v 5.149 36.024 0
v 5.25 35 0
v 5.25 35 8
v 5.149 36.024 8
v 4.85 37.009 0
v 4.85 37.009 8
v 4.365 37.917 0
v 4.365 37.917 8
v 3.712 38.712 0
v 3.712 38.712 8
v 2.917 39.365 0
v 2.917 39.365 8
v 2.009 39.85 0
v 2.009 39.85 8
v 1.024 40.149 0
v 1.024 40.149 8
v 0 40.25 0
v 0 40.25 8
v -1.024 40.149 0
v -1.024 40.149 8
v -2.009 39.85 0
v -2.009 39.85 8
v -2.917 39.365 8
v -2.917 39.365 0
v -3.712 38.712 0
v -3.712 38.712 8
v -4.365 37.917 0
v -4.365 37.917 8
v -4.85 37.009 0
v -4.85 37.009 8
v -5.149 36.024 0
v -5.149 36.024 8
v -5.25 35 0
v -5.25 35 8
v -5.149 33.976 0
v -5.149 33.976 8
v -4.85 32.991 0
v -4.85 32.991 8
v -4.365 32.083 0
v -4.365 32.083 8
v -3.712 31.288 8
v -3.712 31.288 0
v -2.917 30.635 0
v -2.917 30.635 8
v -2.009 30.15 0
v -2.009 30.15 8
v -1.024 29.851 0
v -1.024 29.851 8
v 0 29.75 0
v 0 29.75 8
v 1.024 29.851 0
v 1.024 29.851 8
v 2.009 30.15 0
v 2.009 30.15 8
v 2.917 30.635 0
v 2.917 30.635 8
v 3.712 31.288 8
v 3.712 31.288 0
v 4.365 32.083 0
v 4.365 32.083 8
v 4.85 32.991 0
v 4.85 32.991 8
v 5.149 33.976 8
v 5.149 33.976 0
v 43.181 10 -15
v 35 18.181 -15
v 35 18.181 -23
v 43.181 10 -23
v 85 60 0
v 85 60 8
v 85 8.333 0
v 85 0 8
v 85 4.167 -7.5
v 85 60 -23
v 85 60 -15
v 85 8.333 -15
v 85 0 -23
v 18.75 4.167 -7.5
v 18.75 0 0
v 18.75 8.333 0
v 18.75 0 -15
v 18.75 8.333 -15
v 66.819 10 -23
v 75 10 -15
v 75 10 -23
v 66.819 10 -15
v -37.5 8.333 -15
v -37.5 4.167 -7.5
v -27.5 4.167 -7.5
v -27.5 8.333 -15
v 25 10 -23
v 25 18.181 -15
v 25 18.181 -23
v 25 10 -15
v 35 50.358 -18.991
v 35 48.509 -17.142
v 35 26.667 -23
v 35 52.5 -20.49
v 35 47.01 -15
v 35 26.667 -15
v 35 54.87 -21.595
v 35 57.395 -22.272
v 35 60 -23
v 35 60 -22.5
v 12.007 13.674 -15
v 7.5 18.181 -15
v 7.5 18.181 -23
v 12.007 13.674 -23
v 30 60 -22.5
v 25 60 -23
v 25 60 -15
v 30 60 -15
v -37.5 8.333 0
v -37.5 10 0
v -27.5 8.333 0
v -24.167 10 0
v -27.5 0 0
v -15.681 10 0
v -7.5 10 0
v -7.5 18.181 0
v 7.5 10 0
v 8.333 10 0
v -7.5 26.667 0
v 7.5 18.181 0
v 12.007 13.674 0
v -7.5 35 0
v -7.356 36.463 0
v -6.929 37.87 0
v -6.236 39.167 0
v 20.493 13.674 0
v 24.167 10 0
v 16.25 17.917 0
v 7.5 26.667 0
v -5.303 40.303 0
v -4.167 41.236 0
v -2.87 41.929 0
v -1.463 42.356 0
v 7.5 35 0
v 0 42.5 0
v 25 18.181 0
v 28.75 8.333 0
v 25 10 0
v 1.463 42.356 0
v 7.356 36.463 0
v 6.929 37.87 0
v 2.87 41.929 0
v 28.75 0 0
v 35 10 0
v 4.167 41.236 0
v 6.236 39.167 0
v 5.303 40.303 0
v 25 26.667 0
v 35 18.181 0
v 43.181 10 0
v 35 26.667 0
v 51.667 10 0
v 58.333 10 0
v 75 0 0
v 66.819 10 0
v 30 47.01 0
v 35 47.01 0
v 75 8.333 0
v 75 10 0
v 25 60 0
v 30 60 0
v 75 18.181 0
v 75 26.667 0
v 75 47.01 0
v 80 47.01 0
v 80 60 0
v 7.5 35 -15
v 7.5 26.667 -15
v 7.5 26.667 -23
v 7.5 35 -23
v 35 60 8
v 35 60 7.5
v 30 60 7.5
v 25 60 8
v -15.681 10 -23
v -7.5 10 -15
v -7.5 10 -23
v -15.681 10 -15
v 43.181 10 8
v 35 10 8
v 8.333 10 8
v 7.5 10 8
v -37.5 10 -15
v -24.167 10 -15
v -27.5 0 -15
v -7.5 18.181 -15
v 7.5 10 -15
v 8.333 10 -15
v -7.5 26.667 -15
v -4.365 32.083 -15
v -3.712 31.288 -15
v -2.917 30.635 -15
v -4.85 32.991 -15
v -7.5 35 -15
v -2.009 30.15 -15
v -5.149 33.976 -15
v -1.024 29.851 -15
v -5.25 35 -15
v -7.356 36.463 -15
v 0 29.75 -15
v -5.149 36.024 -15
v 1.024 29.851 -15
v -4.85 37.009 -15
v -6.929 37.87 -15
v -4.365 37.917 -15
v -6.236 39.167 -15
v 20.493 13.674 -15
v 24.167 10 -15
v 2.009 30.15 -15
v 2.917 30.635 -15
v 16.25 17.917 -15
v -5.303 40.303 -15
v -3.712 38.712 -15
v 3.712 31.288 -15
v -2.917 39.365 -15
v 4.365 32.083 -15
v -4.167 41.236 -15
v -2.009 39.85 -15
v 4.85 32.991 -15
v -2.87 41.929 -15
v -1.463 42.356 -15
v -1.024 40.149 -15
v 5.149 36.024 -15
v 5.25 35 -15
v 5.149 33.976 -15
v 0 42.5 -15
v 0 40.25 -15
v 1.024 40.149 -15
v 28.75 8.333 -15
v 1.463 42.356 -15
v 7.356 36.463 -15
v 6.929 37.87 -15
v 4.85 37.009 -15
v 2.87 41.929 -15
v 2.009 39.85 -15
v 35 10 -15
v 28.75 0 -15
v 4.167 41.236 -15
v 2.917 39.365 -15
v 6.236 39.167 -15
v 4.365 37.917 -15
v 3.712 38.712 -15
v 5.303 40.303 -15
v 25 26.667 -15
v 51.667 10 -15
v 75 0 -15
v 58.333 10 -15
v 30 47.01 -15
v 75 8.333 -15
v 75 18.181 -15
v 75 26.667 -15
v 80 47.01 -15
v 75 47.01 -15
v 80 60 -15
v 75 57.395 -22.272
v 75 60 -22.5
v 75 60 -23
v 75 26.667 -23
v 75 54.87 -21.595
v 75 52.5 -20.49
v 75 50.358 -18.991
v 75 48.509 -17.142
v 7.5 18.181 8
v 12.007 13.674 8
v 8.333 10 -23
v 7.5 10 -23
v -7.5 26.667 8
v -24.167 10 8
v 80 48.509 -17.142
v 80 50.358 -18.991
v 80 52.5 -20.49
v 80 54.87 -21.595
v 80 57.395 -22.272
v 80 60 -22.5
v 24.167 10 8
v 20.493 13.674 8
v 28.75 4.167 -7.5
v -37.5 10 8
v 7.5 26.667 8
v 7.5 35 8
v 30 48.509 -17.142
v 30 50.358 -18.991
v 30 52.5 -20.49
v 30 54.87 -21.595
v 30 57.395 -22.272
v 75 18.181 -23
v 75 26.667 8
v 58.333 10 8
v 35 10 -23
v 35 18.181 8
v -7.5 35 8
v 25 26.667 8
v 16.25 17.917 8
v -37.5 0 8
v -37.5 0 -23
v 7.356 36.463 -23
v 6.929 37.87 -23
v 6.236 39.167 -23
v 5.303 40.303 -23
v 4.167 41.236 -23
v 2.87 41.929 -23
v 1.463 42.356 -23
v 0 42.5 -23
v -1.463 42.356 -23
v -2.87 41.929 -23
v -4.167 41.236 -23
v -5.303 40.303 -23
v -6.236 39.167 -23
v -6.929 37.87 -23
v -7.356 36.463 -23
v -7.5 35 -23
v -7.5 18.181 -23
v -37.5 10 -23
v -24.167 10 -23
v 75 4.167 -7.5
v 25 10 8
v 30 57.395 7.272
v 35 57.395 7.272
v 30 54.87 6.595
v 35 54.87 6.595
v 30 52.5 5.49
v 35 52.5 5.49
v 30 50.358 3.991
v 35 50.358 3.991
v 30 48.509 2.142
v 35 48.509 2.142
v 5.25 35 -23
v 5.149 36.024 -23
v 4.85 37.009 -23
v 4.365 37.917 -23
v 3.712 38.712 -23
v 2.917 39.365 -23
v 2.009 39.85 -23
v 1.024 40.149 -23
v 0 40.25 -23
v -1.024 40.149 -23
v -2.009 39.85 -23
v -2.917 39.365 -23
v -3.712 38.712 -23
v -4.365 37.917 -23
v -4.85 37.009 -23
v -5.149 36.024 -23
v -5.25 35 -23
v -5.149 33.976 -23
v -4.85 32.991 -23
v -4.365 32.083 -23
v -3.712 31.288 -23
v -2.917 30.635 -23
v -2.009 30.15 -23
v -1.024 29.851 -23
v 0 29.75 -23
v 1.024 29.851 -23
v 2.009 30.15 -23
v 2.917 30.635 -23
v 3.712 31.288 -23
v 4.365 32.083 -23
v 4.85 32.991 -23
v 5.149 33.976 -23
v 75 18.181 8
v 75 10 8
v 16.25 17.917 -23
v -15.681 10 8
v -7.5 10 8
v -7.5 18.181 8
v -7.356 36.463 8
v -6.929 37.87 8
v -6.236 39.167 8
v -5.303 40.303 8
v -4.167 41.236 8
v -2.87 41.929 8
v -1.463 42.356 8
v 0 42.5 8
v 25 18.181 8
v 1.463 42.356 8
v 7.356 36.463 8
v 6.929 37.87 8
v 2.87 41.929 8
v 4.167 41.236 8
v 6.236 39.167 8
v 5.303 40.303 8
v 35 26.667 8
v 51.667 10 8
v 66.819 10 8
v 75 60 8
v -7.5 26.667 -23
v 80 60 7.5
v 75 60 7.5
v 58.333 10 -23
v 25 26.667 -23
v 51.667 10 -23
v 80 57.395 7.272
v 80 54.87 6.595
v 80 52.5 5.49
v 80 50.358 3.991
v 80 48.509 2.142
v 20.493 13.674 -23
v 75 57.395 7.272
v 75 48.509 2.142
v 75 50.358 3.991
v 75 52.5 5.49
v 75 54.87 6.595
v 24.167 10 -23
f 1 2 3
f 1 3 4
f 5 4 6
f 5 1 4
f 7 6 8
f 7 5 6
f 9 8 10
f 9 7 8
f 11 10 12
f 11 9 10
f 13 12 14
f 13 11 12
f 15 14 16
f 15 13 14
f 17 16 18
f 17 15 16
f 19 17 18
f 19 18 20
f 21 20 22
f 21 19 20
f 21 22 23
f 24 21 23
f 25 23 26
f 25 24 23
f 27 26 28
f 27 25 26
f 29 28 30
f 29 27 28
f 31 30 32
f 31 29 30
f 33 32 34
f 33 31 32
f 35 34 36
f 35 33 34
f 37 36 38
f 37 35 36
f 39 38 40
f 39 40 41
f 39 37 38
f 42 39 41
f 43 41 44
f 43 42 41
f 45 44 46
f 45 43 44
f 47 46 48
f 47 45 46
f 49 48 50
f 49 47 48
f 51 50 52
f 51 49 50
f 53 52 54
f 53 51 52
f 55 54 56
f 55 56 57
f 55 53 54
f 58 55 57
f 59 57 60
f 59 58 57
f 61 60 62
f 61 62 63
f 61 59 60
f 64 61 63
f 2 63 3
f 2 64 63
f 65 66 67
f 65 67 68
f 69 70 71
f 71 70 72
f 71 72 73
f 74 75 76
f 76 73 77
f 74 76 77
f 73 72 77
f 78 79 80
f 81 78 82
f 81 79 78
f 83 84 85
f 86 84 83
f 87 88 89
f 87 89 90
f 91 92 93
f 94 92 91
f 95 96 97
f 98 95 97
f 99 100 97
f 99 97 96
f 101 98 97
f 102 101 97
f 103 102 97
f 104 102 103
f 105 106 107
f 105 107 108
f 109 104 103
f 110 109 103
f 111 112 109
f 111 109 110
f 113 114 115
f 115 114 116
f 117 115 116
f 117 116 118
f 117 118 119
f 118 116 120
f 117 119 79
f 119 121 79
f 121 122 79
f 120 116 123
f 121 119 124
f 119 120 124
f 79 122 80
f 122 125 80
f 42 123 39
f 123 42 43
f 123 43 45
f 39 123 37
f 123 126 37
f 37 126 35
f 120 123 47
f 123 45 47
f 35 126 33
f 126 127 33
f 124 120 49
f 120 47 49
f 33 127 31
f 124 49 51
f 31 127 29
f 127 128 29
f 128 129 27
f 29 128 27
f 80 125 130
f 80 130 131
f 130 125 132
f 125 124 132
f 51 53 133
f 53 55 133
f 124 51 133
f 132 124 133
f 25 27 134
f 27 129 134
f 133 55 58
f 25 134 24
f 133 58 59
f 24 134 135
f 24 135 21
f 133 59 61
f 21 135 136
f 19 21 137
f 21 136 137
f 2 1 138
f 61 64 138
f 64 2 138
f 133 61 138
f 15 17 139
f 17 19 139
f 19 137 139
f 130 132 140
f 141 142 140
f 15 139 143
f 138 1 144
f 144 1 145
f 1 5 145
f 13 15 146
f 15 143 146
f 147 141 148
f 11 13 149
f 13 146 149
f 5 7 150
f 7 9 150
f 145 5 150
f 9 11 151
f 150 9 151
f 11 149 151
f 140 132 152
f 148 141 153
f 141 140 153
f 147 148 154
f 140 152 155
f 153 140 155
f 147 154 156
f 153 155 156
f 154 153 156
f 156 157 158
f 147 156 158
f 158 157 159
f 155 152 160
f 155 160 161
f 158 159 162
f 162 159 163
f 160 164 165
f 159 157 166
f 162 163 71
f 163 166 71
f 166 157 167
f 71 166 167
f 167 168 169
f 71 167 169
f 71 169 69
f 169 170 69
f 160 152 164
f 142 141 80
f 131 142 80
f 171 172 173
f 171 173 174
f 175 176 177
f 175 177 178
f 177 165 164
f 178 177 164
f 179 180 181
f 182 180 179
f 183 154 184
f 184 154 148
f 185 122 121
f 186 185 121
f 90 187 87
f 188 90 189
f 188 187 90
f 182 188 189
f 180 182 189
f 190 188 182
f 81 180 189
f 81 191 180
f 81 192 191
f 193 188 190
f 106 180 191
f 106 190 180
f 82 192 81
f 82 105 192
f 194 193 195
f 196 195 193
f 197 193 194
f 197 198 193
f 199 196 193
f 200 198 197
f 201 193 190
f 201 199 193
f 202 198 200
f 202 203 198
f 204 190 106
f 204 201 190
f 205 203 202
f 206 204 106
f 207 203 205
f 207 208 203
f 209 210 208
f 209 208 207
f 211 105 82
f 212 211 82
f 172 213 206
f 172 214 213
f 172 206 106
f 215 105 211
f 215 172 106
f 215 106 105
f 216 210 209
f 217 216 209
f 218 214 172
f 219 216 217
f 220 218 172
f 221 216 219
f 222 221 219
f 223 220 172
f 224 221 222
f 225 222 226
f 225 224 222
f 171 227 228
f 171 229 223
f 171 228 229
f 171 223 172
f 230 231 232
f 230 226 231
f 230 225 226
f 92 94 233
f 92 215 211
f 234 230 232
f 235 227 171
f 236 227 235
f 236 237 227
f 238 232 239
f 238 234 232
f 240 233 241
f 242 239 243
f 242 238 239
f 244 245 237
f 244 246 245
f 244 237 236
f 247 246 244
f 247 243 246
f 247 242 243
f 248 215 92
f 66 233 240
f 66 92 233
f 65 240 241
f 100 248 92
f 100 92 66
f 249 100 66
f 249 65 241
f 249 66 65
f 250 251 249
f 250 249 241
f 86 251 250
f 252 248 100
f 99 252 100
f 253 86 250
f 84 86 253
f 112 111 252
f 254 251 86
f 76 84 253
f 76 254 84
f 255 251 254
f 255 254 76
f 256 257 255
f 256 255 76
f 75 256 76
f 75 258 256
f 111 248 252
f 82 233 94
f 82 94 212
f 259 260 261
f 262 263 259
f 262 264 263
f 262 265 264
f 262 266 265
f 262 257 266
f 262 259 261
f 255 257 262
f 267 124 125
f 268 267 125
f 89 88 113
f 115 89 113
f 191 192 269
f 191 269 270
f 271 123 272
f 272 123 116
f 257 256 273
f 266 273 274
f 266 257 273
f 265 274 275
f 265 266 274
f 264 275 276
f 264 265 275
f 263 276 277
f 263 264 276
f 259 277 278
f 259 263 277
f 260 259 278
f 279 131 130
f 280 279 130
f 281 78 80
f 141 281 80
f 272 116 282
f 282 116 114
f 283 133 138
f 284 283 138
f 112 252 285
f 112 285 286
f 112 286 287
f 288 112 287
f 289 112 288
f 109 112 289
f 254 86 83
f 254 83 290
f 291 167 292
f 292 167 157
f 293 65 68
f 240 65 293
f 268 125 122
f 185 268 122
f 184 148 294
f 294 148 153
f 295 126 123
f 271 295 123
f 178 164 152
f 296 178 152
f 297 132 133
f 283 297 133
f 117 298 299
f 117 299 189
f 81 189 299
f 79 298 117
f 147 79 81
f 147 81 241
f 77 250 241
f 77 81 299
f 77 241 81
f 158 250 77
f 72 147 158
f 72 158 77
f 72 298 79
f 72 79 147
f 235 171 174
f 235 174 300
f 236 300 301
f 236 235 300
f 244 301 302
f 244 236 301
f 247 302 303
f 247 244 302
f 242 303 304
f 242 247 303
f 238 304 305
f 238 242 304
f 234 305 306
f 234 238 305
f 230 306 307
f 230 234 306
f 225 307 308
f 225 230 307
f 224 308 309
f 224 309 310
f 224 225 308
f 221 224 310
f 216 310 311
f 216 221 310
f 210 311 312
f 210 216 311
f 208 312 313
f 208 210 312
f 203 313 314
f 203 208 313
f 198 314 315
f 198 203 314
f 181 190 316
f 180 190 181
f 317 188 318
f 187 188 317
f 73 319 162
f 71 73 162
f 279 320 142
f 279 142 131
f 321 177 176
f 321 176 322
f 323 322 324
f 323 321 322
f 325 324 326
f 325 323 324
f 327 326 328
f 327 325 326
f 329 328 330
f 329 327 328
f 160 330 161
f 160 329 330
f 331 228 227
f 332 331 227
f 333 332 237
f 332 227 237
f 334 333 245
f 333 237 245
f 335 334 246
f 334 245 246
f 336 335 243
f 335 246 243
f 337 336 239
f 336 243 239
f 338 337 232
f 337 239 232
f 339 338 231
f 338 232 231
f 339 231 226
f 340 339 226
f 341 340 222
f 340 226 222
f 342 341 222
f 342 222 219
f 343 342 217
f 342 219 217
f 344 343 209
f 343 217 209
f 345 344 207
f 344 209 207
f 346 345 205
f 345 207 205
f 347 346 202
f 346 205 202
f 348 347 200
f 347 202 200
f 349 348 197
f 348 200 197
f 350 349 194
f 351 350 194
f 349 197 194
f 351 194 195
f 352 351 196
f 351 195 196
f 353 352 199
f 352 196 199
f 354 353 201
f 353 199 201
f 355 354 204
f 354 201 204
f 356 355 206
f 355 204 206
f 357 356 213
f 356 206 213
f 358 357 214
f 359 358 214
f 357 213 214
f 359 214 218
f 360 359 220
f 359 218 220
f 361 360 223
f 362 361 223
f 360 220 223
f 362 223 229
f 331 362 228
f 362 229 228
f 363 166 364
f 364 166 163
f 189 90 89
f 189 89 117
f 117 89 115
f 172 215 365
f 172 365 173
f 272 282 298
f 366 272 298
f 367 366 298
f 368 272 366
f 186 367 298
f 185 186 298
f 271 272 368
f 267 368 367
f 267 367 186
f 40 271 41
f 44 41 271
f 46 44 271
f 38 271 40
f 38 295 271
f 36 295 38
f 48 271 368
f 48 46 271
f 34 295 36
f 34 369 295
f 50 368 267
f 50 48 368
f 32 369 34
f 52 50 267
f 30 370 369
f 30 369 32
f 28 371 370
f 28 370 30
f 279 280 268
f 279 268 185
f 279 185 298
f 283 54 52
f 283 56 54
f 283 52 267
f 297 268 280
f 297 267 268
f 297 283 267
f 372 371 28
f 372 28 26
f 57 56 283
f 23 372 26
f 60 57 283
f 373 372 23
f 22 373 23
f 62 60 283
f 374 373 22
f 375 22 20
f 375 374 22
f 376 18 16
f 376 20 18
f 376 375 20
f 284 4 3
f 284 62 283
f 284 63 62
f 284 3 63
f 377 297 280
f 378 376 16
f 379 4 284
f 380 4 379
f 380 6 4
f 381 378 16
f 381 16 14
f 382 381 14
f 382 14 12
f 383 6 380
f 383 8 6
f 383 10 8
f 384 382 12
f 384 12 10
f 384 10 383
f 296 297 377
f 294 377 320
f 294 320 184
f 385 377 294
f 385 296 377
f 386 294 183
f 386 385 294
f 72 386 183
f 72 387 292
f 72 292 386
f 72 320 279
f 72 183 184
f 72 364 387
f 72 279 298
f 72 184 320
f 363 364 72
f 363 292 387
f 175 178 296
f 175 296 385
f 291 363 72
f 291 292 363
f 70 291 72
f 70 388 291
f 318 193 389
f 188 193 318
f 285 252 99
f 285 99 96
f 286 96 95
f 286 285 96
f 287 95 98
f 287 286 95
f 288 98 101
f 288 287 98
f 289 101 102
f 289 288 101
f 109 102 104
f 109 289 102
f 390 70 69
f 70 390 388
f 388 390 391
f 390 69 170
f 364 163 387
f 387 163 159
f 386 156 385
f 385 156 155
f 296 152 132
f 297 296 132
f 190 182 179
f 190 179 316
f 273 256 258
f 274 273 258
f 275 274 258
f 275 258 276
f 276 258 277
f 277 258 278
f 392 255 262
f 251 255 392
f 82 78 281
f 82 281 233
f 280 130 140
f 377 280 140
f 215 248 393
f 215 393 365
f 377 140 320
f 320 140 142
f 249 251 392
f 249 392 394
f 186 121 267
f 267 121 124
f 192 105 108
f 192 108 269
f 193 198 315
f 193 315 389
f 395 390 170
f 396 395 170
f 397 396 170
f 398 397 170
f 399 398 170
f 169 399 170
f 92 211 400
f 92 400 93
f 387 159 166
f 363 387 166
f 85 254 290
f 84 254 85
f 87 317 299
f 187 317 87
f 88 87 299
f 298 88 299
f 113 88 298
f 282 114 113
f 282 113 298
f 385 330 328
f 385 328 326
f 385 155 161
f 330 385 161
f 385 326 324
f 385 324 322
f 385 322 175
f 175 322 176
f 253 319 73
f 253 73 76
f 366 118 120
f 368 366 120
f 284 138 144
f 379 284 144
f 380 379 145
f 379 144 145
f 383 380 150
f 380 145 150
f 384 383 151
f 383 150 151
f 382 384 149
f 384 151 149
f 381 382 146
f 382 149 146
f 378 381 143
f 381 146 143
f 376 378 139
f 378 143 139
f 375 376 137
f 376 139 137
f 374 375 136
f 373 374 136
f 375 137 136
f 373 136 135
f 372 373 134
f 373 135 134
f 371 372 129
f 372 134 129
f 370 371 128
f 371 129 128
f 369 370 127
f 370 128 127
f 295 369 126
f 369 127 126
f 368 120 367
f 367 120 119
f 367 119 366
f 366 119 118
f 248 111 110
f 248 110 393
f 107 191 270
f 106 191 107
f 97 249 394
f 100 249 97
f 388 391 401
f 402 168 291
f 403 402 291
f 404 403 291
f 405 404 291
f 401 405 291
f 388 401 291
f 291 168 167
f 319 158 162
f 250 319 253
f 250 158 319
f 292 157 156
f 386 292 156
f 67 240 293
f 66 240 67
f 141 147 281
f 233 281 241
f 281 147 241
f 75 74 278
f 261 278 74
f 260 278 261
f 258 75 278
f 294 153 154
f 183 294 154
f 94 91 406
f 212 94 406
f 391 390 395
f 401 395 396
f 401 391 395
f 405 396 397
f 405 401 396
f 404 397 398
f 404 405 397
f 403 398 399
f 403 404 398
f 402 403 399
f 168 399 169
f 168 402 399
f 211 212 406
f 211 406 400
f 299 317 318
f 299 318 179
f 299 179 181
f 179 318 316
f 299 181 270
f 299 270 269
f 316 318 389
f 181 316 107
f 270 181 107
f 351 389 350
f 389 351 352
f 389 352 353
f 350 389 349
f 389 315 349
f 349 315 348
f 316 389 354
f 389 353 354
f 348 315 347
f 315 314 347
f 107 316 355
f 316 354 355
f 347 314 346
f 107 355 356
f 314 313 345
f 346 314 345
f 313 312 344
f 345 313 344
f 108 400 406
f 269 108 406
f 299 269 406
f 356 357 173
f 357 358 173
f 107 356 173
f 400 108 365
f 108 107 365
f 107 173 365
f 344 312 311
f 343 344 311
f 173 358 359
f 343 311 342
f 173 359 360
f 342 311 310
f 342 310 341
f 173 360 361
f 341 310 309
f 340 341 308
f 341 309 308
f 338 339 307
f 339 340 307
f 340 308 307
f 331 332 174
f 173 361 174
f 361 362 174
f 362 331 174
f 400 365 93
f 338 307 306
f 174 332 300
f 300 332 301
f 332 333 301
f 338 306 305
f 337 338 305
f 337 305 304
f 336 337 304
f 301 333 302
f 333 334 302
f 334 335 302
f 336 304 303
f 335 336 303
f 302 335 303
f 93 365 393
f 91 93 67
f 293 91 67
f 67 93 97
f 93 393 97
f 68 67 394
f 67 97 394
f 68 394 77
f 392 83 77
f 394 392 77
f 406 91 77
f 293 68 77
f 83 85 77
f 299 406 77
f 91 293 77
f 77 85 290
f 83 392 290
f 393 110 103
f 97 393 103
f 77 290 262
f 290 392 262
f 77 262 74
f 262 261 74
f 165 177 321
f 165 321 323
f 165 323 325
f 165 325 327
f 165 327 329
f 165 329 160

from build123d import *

# Parameters (mm, degrees)
SKETCH1_R            = 5.25
BOSS_EXTRUDE1_DEPTH  = 8
BOSS_EXTRUDE2_DEPTH  = 10
LPATTERN1_COUNT      = 3
LPATTERN1_PITCH      = 56.25
MIRROR1_COPY_1_DEPTH = 10
MIRROR1_COPY_2_DEPTH = 10
CUT_EXTRUDE1_START   = -5
SKETCH3_R            = 15
CUT_EXTRUDE1_DEPTH   = 50


with BuildPart() as part:
    # Sketch1 → Boss-Extrude1 (new body)
    with BuildSketch(Plane.XY):
        with BuildLine():
            Line((85, 0), (85, 60))
            Line((85, 60), (75, 60))
            Line((75, 60), (75, 26.666666667))
            Line((75, 26.666666667), (58.333333333, 10))
            Line((58.333333333, 10), (51.666666667, 10))
            Line((51.666666667, 10), (35, 26.666666667))
            Line((35, 26.666666667), (35, 60))
            Line((35, 60), (25, 60))
            Line((25, 60), (25, 26.666666667))
            Line((25, 26.666666667), (16.25, 17.916666667))
            Line((16.25, 17.916666667), (7.5, 26.666666667))
            Line((7.5, 26.666666667), (7.5, 35))
            ThreePointArc((7.5, 35), (0, 42.5), (-7.5, 35))
            Line((-7.5, 35), (-7.5, 26.666666667))
            Line((-7.5, 26.666666667), (-24.166666667, 10))
            Line((-24.166666667, 10), (-37.5, 10))
            Line((-37.5, 10), (-37.5, 0))
            Line((-37.5, 0), (85, 0))
        make_face()
        Polygon((12.007359313, 13.67402598), (8.333333333, 10), (7.5, 10), (7.5, 18.181385292), align=None, mode=Mode.SUBTRACT)
        with Locations((0, 35)):
            Circle(SKETCH1_R, mode=Mode.SUBTRACT)
        Polygon((24.166666667, 10), (20.492640687, 13.67402598), (25, 18.181385292), (25, 10), align=None, mode=Mode.SUBTRACT)
        Polygon((35, 10), (35, 18.181385292), (43.181385292, 10), align=None, mode=Mode.SUBTRACT)
        Polygon((75, 10), (66.818614708, 10), (75, 18.181385292), align=None, mode=Mode.SUBTRACT)
        Polygon((-7.5, 10), (-15.681385292, 10), (-7.5, 18.181385292), align=None, mode=Mode.SUBTRACT)
    boss_extrude1 = extrude(amount=BOSS_EXTRUDE1_DEPTH)

    # Sketch2 → Boss-Extrude2 (add)
    with BuildSketch(Plane(origin=(-37.5, 0, 0), x_dir=(0, 0, -1), z_dir=(1, 0, 0))):
        Polygon((7.5, 4.166666667), (0, 8.333333333), (0, 0), (7.5, 0), align=None)
    boss_extrude2 = extrude(amount=BOSS_EXTRUDE2_DEPTH)

    # LPattern1: Boss-Extrude2 ×3
    with Locations(*[(i * LPATTERN1_PITCH, 0, 0) for i in range(1, LPATTERN1_COUNT)]):
        add(boss_extrude2)

    # Mirror1: Boss-Extrude1, Boss-Extrude2 across plane
    add(boss_extrude1.mirror(Plane(origin=(-27.5, 0, -7.5), x_dir=(1, 0, 0), z_dir=(0, 0, 1))))
    add(boss_extrude2.mirror(Plane(origin=(-27.5, 0, -7.5), x_dir=(1, 0, 0), z_dir=(0, 0, 1))))

    # Mirror1 copy 1 sketch → Mirror1 copy 1 (add)
    with BuildSketch(Plane(origin=(18.75, 0, -15), x_dir=(0, 0, 1), z_dir=(1, 0, 0))):
        Polygon((7.5, -4.166666667), (0, -8.333333333), (0, 0), (7.5, 0), align=None)
    extrude(amount=MIRROR1_COPY_1_DEPTH)

    # Mirror1 copy 2 sketch → Mirror1 copy 2 (add)
    with BuildSketch(Plane(origin=(75, 0, -15), x_dir=(0, 0, 1), z_dir=(1, 0, 0))):
        Polygon((7.5, -4.166666667), (0, -8.333333333), (0, 0), (7.5, 0), align=None)
    extrude(amount=MIRROR1_COPY_2_DEPTH)

    # Sketch3 → Cut-Extrude1 (cut)
    with BuildSketch(Plane(origin=(35, 0, 0), x_dir=(0, 0, -1), z_dir=(1, 0, 0)).offset(CUT_EXTRUDE1_START)):
        with Locations((7.5, 60)):
            Circle(SKETCH3_R)
    extrude(amount=CUT_EXTRUDE1_DEPTH, mode=Mode.SUBTRACT)


solid = part.part
